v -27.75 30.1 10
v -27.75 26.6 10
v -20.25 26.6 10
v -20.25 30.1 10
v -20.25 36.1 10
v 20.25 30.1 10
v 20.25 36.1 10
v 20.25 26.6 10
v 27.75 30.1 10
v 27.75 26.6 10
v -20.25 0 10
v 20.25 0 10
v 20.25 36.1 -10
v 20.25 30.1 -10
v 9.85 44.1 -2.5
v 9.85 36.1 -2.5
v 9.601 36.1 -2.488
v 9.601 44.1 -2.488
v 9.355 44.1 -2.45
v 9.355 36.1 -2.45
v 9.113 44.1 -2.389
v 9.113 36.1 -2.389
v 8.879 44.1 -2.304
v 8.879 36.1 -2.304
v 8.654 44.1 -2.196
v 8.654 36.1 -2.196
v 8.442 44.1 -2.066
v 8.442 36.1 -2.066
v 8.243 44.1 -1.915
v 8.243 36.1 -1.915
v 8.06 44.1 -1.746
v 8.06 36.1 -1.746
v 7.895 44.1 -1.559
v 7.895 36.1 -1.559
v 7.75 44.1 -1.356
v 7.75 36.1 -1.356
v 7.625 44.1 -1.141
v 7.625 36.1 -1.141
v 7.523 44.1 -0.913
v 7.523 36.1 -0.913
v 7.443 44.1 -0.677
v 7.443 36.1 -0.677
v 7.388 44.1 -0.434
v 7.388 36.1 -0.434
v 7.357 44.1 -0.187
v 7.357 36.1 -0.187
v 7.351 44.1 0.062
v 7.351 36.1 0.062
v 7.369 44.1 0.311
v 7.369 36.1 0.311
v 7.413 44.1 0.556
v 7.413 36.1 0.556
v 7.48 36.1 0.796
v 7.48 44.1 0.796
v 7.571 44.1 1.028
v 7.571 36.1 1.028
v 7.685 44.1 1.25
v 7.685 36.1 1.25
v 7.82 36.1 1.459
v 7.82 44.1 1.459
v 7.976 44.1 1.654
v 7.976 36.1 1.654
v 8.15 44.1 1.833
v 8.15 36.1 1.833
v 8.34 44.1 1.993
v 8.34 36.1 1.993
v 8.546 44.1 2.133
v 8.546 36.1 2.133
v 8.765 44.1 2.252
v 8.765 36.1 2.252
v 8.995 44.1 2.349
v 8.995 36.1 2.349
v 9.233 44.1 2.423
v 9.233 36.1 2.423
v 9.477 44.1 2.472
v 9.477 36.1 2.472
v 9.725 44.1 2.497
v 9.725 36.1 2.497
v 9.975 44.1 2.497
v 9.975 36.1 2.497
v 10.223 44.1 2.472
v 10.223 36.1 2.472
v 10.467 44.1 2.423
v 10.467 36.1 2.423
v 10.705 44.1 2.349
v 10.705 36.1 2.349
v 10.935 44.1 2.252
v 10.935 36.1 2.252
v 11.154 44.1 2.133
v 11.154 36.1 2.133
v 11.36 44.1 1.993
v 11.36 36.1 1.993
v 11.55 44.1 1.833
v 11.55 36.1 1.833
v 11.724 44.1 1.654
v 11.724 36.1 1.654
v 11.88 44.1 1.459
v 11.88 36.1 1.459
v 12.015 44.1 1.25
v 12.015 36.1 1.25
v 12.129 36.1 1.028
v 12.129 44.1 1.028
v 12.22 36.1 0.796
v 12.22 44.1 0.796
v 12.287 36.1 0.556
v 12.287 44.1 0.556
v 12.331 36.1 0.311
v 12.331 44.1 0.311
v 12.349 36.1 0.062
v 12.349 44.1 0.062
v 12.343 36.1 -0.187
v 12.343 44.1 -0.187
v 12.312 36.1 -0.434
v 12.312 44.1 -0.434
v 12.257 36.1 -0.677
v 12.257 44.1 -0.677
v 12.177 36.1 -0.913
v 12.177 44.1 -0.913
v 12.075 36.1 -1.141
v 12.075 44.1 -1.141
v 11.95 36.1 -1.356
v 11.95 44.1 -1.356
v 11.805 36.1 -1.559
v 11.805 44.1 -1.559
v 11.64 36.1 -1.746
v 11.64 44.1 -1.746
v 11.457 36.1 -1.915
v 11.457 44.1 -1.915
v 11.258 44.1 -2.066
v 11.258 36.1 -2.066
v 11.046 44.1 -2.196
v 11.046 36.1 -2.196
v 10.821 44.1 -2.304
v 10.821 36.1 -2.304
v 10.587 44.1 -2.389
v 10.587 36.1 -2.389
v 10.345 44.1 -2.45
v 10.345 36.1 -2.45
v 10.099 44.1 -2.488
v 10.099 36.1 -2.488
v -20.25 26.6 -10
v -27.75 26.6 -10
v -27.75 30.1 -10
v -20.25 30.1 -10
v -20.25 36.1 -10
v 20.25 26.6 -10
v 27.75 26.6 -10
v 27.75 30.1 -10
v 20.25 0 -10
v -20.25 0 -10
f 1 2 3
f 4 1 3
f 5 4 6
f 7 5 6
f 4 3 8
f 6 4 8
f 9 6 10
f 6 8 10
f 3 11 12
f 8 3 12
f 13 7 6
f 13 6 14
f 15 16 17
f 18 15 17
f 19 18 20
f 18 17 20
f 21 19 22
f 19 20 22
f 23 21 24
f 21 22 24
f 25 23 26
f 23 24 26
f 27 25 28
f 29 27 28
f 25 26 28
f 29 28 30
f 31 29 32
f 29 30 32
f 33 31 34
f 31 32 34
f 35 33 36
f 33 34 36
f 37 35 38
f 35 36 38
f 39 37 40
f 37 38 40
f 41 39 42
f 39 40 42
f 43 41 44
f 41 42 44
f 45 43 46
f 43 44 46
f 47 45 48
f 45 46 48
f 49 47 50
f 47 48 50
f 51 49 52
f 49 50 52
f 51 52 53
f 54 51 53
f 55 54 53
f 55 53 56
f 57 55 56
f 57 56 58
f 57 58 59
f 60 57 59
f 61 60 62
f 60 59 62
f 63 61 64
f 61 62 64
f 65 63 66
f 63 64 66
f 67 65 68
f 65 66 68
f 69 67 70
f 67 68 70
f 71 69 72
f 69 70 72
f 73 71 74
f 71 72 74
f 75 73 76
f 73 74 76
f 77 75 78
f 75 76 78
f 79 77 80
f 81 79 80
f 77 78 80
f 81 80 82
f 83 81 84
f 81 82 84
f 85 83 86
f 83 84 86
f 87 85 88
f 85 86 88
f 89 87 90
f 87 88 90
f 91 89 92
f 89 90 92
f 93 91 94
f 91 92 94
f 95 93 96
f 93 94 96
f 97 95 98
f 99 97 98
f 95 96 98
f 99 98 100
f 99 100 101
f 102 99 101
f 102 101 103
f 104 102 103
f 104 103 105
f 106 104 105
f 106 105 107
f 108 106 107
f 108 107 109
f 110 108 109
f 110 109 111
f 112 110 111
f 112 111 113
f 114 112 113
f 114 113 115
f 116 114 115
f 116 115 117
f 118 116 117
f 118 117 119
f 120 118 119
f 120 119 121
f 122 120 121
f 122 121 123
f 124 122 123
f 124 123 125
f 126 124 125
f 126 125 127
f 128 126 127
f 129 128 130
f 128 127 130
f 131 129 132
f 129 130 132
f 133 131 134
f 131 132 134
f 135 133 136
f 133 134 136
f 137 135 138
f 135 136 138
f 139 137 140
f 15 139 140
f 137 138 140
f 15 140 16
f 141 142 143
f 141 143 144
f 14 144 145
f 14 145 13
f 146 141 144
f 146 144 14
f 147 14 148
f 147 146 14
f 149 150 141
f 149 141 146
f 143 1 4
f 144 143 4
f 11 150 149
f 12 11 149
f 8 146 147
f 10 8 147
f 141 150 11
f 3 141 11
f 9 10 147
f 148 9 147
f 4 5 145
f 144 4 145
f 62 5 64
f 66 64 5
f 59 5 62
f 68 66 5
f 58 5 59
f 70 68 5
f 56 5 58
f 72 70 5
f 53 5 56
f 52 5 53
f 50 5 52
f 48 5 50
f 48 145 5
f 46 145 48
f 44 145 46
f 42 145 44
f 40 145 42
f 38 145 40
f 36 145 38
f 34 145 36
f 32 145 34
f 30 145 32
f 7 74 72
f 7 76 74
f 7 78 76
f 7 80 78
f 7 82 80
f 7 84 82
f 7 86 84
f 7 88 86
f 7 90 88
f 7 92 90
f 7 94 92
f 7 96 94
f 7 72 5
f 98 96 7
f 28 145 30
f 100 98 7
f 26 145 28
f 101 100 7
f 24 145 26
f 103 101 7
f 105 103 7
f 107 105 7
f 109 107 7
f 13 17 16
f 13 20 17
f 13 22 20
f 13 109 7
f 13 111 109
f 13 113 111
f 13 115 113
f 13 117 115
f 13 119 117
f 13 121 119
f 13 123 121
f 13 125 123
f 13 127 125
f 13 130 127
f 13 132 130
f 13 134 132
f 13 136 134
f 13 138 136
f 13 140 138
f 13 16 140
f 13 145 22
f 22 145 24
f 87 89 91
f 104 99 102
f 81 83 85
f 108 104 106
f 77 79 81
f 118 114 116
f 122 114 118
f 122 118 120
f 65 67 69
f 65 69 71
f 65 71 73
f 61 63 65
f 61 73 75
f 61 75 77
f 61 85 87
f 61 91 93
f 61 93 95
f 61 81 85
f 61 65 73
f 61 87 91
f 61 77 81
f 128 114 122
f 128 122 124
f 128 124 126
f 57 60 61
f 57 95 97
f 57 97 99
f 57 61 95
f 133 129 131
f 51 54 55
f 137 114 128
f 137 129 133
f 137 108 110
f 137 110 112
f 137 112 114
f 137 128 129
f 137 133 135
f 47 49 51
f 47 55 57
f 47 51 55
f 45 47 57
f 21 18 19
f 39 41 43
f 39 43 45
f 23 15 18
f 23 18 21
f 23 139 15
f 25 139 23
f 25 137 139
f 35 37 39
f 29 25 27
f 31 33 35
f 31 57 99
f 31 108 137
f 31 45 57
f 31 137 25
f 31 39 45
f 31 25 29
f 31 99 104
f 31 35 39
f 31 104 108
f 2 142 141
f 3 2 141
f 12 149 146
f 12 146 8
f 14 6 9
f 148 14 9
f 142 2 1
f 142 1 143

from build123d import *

# Parameters (mm, degrees)
SKETCH1_W           = 55.5
SKETCH1_H           = 20
BOSS_EXTRUDE1_DEPTH = 36.1
SKETCH2_W           = 7.5
SKETCH2_H           = 20
CUT_EXTRUDE1_DEPTH  = 26.6
SKETCH3_W           = 7.5
SKETCH3_H           = 20
CUT_EXTRUDE2_DEPTH  = 6
SKETCH4_R           = 2.5
BOSS_EXTRUDE2_DEPTH = 8


with BuildPart() as part:
    # Sketch1 → Boss-Extrude1 (new body)
    with BuildSketch(Plane(origin=(0, 0, 0), x_dir=(1, 0, 0), z_dir=(0, 1, 0))):
        Rectangle(SKETCH1_W, SKETCH1_H)
    extrude(amount=BOSS_EXTRUDE1_DEPTH)

    # Sketch2 → Cut-Extrude1 (cut)
    with BuildSketch(Plane.XZ):
        with Locations((24, 0)):
            Rectangle(SKETCH2_W, SKETCH2_H)
        with Locations((-24, 0)):
            Rectangle(SKETCH2_W, SKETCH2_H)
    extrude(amount=-CUT_EXTRUDE1_DEPTH, mode=Mode.SUBTRACT)

    # Sketch3 → Cut-Extrude2 (cut)
    with BuildSketch(Plane(origin=(0, 36.1, 0), x_dir=(1, 0, 0), z_dir=(0, 1, 0))):
        with Locations((24, 0)):
            Rectangle(SKETCH3_W, SKETCH3_H)
        with Locations((-24, 0)):
            Rectangle(SKETCH3_W, SKETCH3_H)
    extrude(amount=-CUT_EXTRUDE2_DEPTH, mode=Mode.SUBTRACT)

    # Sketch4 → Boss-Extrude2 (add)
    with BuildSketch(Plane(origin=(0, 36.1, 0), x_dir=(1, 0, 0), z_dir=(0, 1, 0))):
        with Locations(Location((9.85, 0, 0), (0, 0, 90))):
            Circle(SKETCH4_R)
    extrude(amount=BOSS_EXTRUDE2_DEPTH)


solid = part.part
